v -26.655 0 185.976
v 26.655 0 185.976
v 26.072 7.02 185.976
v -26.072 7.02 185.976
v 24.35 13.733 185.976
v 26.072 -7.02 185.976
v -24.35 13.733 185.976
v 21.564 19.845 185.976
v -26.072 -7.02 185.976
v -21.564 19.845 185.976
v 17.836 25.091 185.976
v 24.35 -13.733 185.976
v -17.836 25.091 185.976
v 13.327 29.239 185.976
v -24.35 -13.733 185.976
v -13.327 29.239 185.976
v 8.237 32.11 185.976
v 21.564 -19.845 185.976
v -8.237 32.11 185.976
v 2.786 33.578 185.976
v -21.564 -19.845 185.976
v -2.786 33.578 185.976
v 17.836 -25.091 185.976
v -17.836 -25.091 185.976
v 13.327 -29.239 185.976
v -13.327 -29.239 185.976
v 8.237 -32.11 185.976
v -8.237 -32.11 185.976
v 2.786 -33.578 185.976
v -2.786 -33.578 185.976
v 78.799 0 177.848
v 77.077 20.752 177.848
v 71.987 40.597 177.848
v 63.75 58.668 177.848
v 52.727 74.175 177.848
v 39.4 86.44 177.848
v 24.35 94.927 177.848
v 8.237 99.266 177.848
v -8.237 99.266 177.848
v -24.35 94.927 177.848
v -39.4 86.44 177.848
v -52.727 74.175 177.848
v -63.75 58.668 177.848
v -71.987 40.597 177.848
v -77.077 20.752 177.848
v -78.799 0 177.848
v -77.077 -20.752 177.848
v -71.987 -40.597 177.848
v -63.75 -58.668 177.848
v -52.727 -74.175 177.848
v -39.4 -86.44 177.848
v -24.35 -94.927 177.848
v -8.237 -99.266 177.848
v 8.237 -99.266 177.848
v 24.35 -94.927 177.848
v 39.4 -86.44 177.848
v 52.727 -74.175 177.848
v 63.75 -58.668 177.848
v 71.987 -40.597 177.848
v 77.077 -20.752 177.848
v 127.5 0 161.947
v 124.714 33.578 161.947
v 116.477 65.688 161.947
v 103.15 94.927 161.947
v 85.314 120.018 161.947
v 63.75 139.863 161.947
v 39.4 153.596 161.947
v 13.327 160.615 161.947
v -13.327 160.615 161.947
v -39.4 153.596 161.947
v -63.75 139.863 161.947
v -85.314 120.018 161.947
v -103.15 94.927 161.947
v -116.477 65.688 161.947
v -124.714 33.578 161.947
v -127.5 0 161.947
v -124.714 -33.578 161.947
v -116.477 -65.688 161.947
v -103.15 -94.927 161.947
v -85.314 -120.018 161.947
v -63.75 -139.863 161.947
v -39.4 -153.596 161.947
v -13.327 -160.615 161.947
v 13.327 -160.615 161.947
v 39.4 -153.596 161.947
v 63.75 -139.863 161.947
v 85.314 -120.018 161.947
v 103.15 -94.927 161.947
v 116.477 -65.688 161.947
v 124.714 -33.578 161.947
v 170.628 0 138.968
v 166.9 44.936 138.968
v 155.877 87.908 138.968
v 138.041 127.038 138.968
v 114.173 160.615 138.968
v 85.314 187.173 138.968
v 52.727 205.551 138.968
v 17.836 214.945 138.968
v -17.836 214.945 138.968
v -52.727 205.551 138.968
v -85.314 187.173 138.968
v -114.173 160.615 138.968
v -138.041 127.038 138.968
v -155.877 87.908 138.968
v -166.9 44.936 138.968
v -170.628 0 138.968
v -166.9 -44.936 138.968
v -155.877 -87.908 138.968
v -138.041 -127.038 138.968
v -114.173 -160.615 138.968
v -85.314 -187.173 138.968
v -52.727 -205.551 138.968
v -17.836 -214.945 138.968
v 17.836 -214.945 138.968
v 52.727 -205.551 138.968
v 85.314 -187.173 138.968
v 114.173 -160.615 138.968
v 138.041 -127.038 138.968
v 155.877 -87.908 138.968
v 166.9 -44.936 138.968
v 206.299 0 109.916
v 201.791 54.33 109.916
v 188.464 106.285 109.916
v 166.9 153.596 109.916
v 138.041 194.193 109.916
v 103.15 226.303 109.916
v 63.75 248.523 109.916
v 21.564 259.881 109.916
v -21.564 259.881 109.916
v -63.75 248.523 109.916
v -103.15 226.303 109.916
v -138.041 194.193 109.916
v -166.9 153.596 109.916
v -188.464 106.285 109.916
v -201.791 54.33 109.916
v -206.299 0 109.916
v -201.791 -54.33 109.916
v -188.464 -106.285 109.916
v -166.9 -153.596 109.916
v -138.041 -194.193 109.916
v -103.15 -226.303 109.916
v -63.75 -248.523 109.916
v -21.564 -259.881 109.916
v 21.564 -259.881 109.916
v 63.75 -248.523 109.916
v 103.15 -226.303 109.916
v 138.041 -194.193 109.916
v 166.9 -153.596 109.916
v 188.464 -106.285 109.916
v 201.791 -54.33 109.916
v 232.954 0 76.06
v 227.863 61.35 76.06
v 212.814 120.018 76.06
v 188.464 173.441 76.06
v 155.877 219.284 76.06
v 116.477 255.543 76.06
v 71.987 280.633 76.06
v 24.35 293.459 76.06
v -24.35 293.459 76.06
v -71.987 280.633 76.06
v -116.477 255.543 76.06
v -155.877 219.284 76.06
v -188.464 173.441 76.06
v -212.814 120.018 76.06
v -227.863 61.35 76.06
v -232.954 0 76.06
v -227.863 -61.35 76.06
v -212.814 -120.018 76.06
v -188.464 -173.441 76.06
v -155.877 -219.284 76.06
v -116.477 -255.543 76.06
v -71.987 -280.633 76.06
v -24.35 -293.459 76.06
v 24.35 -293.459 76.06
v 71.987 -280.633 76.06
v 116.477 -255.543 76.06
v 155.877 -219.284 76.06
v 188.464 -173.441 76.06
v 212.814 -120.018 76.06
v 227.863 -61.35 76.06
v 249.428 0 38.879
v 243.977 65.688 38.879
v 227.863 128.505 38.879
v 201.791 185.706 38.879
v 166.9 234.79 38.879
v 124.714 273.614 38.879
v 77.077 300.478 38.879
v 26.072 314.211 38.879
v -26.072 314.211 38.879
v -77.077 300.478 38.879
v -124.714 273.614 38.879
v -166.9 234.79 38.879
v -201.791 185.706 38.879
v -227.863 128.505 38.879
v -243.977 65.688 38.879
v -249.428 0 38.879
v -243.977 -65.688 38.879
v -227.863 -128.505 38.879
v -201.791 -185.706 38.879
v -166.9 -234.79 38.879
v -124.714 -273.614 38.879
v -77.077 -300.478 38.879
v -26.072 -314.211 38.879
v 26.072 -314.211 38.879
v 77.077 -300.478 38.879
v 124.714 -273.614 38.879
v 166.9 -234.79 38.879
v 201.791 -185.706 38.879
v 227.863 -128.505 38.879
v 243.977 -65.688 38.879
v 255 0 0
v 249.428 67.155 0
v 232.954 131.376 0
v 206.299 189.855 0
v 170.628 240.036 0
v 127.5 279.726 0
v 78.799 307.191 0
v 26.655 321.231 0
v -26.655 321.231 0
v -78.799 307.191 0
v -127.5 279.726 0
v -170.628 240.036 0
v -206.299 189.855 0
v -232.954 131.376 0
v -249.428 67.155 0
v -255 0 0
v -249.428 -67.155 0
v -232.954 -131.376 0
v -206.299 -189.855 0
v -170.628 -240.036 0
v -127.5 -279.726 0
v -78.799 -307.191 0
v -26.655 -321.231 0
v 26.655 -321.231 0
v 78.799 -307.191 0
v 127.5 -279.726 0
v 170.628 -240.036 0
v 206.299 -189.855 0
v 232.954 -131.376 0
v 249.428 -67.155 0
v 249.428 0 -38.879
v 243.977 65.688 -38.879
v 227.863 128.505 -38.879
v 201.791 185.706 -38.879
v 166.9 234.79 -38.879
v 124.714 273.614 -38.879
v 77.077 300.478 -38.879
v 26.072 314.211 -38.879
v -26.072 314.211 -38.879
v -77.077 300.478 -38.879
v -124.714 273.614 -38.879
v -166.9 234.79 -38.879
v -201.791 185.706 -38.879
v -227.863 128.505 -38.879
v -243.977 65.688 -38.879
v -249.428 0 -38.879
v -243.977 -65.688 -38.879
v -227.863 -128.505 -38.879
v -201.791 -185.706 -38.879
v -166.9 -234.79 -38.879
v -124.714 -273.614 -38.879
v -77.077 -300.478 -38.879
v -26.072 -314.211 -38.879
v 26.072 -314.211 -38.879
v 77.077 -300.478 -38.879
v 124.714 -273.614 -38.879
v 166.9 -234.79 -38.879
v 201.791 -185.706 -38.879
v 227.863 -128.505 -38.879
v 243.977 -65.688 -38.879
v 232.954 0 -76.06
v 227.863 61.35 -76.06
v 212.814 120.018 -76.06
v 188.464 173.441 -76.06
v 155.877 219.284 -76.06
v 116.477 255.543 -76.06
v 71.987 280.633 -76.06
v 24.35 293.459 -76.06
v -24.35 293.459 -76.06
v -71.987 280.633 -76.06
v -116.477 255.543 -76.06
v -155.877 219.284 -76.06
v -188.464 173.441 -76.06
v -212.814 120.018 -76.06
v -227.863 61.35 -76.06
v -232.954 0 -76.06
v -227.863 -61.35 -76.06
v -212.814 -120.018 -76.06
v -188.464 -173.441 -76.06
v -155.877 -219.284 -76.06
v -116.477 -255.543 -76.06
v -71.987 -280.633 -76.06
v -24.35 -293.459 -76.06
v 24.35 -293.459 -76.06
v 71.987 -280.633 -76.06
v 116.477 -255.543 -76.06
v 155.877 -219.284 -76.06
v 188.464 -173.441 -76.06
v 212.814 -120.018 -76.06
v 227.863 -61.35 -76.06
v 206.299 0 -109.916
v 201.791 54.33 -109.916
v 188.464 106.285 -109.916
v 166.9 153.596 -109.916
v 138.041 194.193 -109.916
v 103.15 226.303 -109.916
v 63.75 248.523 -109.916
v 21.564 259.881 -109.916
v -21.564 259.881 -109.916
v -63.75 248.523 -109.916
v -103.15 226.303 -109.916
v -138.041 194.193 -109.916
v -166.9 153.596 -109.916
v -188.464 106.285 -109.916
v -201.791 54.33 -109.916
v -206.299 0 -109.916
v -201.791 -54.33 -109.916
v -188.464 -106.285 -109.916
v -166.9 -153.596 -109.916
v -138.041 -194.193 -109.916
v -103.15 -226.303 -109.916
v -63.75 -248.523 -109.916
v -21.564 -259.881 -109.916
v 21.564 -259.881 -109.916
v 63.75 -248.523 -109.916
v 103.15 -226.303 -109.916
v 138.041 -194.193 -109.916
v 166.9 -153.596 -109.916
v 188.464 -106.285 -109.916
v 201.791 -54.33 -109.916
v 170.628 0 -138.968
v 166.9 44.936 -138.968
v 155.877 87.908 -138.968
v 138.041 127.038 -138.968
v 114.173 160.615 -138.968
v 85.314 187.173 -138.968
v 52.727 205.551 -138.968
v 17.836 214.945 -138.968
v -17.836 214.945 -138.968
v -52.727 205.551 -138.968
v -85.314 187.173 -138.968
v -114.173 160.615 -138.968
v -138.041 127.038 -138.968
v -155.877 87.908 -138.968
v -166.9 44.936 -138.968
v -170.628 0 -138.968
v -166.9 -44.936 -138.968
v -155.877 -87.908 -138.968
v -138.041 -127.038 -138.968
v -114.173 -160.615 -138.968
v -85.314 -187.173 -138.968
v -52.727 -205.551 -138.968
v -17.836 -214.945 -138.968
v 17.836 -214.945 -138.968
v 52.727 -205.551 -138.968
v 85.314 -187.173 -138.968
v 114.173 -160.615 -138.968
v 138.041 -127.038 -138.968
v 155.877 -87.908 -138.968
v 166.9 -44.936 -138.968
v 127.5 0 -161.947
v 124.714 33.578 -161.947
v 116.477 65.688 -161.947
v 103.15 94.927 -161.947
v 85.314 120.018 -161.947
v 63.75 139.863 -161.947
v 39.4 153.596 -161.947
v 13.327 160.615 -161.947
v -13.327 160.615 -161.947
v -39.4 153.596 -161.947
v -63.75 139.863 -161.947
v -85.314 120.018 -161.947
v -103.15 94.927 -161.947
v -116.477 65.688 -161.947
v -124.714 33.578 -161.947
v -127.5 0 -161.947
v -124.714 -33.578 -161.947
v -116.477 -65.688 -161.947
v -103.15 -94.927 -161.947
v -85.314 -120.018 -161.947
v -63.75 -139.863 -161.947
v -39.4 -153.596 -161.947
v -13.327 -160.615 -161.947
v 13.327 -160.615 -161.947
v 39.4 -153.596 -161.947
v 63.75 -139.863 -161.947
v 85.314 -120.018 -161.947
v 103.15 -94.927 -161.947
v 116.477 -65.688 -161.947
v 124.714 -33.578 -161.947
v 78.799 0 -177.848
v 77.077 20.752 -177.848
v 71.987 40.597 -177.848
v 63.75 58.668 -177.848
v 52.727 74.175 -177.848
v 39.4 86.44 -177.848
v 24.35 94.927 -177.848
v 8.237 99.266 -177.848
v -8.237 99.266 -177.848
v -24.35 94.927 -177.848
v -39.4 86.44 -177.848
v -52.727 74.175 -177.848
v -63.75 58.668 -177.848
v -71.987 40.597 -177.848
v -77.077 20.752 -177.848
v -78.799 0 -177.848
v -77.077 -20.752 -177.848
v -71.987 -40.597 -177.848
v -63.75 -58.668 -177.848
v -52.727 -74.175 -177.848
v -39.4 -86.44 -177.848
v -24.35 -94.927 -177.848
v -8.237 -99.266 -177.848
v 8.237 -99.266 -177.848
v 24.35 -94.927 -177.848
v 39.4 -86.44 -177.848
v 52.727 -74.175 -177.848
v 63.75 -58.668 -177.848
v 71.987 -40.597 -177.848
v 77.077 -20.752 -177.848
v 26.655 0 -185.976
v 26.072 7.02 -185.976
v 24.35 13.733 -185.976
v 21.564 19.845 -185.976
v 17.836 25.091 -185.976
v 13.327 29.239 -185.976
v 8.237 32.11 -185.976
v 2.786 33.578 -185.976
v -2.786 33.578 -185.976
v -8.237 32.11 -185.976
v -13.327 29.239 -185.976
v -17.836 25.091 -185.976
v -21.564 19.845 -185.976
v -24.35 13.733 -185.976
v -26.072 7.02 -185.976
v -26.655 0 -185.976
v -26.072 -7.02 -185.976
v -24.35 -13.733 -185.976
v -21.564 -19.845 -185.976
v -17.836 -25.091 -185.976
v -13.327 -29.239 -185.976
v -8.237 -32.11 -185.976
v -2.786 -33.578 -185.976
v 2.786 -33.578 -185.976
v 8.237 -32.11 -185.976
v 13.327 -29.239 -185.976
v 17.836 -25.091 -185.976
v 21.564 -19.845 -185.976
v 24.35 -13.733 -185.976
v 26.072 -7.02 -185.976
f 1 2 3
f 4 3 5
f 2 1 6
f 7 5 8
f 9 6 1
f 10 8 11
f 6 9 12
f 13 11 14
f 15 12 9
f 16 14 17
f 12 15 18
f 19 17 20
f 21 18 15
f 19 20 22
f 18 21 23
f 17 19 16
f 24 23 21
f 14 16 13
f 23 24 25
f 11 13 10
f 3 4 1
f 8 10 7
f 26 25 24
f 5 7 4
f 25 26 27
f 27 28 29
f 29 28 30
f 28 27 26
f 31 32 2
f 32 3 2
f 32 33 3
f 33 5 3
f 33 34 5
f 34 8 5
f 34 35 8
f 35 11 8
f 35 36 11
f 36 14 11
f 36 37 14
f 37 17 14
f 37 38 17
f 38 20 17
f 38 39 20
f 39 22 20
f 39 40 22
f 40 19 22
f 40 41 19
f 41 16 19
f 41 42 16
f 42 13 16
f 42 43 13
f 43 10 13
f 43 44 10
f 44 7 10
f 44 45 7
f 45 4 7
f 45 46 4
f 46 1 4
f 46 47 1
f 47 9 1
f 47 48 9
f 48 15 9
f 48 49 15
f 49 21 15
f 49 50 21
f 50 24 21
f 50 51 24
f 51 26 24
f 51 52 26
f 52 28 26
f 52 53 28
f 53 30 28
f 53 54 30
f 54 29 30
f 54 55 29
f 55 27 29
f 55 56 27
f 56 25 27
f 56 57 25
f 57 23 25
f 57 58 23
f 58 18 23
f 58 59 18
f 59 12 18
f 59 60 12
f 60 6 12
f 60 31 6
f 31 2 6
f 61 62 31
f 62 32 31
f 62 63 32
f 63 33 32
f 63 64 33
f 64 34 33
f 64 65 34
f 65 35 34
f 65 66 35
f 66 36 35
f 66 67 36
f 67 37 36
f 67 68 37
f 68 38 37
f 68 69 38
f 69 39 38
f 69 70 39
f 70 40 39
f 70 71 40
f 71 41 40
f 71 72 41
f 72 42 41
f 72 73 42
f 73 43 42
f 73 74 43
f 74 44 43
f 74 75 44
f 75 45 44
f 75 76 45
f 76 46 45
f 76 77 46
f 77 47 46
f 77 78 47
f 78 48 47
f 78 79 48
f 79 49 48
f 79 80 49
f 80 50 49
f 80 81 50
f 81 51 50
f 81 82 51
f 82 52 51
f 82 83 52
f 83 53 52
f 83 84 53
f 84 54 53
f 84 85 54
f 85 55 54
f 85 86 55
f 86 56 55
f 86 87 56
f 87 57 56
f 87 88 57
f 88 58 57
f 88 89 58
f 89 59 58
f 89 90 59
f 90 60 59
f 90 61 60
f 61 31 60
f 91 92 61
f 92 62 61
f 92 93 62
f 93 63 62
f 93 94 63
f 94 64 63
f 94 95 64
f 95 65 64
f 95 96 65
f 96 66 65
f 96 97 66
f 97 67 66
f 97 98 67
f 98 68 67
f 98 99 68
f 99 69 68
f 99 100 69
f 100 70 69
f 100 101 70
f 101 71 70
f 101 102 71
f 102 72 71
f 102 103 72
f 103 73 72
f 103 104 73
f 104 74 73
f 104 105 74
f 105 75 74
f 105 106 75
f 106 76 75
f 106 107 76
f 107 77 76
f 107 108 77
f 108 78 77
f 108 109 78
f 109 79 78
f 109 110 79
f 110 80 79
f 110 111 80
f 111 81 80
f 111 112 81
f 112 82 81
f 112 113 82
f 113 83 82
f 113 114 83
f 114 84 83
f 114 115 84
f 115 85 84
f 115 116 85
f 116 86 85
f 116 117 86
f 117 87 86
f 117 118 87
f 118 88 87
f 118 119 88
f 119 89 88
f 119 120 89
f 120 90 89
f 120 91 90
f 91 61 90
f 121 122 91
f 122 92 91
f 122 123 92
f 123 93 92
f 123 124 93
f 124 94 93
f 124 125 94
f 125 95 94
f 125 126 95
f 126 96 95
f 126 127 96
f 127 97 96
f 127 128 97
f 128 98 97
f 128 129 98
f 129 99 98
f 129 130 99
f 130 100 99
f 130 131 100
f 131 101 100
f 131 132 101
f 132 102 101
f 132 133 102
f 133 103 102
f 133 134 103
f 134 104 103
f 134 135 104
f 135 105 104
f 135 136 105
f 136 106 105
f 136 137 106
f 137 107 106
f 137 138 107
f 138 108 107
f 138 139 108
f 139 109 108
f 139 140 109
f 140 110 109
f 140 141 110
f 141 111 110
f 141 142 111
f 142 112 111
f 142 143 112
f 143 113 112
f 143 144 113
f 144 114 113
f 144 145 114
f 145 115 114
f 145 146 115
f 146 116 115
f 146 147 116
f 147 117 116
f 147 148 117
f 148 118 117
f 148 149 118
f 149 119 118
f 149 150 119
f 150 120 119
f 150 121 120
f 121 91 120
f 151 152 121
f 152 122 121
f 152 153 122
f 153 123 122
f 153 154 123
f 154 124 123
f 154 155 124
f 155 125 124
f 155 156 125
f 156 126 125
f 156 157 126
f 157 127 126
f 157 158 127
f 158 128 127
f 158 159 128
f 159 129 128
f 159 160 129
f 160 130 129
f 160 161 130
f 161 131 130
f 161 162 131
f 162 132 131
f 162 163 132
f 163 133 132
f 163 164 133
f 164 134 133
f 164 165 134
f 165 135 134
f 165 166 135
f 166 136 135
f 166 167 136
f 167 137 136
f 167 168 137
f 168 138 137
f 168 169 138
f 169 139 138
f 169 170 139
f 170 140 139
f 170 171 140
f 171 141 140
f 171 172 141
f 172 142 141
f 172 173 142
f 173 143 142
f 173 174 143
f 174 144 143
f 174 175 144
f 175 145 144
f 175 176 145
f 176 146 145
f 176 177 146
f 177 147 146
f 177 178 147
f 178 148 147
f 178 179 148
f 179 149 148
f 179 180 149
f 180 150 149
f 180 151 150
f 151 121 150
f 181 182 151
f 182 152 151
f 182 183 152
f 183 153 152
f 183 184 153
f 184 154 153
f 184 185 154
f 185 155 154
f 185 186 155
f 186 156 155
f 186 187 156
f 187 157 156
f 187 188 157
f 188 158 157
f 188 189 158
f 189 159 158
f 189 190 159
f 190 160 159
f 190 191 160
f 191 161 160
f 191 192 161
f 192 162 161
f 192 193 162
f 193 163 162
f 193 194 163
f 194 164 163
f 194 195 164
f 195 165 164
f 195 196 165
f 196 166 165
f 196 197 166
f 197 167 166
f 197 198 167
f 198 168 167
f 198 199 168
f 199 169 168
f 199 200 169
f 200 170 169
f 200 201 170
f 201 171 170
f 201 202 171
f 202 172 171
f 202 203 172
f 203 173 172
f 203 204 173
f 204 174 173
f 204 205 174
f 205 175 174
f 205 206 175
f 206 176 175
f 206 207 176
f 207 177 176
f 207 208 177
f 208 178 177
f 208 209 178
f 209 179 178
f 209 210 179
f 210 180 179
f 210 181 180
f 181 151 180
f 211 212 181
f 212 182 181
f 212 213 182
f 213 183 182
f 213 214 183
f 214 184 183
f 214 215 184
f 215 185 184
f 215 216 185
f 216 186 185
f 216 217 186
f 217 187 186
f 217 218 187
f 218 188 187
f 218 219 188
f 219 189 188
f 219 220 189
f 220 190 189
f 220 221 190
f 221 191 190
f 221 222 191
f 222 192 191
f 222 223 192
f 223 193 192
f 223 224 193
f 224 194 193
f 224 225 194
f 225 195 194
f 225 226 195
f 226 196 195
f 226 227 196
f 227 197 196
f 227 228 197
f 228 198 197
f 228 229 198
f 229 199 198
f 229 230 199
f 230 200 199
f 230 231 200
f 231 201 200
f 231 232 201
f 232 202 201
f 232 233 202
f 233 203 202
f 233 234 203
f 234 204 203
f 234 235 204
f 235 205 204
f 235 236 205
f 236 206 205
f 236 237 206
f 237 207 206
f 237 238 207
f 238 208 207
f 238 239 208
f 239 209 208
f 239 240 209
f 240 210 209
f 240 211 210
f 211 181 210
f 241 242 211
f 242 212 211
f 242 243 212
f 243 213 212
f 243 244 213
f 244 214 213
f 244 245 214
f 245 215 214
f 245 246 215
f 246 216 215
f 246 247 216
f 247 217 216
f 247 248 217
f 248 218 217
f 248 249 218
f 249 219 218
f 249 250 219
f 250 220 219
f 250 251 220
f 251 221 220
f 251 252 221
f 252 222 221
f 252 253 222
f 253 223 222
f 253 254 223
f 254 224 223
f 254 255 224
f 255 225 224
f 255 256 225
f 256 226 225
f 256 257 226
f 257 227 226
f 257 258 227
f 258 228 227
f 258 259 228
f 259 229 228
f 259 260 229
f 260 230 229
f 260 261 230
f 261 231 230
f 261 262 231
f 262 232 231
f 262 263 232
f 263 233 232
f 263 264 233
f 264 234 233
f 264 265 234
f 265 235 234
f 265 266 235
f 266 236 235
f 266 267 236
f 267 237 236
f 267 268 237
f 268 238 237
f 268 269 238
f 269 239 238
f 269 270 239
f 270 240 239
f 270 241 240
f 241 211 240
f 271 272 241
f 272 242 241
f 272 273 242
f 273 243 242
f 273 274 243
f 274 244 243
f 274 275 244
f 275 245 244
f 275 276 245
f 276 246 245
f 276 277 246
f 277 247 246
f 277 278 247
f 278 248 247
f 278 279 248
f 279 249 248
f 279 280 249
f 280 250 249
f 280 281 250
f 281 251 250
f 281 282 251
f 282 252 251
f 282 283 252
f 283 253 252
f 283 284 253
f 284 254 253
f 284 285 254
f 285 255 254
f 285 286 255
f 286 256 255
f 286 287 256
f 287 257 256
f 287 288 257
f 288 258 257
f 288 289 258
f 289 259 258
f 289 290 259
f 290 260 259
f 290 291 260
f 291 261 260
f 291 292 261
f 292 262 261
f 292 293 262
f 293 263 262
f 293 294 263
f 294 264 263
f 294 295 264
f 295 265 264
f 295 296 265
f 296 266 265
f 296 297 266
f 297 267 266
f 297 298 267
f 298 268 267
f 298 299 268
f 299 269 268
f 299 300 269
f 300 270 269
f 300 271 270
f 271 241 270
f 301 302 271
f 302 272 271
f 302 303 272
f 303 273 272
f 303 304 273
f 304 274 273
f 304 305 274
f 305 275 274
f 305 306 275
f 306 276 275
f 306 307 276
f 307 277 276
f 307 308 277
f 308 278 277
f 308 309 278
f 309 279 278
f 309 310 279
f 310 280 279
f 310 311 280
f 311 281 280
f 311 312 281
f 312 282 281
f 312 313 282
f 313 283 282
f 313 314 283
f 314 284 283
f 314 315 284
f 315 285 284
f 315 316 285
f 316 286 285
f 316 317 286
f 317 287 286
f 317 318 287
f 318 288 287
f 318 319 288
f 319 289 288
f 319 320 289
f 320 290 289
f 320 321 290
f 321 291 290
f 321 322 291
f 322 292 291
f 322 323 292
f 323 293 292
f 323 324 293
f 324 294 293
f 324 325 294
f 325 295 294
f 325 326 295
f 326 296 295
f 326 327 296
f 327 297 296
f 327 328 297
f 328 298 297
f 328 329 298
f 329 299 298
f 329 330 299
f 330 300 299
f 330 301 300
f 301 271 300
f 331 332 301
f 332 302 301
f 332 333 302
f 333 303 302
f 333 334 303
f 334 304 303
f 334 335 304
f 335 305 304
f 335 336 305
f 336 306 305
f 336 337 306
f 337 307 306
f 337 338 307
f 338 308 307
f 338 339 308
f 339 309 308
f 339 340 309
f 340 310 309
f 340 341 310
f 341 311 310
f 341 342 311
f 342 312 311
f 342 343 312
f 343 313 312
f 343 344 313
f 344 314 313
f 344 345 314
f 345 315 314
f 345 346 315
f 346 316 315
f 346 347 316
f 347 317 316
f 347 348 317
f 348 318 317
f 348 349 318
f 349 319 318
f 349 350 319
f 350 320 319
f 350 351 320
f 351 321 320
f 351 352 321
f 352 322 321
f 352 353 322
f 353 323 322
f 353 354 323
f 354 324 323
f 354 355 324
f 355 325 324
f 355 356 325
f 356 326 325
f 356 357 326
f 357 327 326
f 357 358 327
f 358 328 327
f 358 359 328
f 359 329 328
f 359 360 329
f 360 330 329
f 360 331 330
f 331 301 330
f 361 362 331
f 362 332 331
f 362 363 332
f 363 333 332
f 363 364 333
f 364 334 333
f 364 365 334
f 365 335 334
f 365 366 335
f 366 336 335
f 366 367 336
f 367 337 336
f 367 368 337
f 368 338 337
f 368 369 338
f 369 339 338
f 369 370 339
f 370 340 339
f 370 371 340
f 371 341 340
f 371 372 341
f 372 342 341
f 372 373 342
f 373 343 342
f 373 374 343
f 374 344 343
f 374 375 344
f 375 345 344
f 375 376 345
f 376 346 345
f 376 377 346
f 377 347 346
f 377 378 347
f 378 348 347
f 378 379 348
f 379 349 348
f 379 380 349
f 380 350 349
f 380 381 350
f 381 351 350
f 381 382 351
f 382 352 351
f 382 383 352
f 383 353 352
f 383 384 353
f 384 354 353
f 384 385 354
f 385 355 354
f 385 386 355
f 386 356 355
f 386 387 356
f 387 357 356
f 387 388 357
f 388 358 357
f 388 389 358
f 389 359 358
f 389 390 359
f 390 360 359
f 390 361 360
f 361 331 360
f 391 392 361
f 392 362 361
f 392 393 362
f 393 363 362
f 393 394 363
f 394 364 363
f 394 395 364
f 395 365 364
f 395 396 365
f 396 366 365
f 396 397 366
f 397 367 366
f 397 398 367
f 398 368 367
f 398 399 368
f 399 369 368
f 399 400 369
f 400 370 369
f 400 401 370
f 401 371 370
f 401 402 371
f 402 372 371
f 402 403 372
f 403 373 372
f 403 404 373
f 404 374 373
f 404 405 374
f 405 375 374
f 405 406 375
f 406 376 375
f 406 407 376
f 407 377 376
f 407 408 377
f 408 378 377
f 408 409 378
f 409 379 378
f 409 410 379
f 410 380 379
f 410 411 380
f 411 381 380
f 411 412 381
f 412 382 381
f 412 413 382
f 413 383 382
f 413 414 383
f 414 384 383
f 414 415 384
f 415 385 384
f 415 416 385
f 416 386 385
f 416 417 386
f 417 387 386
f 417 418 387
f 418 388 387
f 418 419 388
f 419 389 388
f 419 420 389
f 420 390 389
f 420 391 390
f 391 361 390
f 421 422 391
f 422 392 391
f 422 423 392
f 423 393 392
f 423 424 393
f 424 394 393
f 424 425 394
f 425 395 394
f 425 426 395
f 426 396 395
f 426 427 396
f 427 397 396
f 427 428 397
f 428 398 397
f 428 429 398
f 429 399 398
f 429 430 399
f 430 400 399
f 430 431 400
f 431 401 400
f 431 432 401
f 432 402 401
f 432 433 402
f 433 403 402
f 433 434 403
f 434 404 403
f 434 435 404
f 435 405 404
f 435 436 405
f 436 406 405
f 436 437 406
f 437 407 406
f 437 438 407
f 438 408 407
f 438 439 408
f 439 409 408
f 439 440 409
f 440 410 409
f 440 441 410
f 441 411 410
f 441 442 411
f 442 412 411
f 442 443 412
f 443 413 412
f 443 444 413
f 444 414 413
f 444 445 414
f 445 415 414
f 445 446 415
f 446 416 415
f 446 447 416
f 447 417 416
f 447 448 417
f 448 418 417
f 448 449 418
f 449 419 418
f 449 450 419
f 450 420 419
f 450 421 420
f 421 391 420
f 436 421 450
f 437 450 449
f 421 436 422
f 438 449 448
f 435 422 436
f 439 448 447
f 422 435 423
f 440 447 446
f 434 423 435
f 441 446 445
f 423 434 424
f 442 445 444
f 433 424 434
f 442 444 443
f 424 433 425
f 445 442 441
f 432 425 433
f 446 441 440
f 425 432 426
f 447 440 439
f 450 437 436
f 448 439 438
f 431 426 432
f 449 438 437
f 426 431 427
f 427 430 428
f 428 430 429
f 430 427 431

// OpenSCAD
// Generated by SolidPython 1.0.1 on 2020-07-29 00:46:52


scale(v = [15, 19, 11]) {
	sphere(r = 17);
}
/***********************************************
*********      SolidPython code:      **********
************************************************
 
# import packages: SolidPython
from solid import *
from solid.utils import *
from itertools import chain, combinations, permutations


class Resize:

    def __init__(self, scad_file):
        self.scad_file = scad_file
        #self.scad_file = import_scad(scad_file)
        # cone/cylinder param:
        self.r1 = 0
        self.r2 = 0
        self.h = 0
        # rectangular prism param:
        self.w = 0
        self.l = 0
        # ellipse param:
        self.r = 0

    # import OpenScad code (file name corresponds to shape)


    # classify shape + parameters
    def assign(self, param1, param2, param3):
        if self.scad_file == 'cone.scad':
            self.r1 = param1
            self.r2 = param2
            self.h = param3
        elif self.scad_file == 'cylinder.scad':
            self.r1 = param1
            self.r2 = param2
            self.h = param3
        elif self.scad_file == 'rectangularPrism.scad':
            self.h = param1
            self.l = param2
            self.w = param3
        else:
            self.r = param1
            self.h = param2

    # resize parameters
    def iterate(self):
        x = range(3, 20, 2)
        i = 1
        if self.scad_file == 'cone.scad':
            tempList = list(permutations(x, 2))
            for temp in tempList:
                param1 = temp[0]
                param2 = temp[1]
                filepath = 'produced_scad_files/' + 'cone' + str(param1) + '_' + str(param2) + '_' + '.scad'
                scad_render_to_file(cylinder(h=param1, r1=param2, r2=0), filepath)

        elif self.scad_file == 'cylinder.scad':
            tempList = list(permutations(x, 3))
            for temp in tempList:
                param1 = temp[0]
                param2 = temp[1]
                filepath = 'produced_scad_files/' + 'cylinder' + str(param1) + '_' + str(param2) + '_' + '.scad'
                scad_render_to_file(cylinder(h=param1, r1=param2, r2=param2), filepath)

        elif self.scad_file == 'rectangularPrism.scad':
            tempList = list(permutations(x, 3))
            for temp in tempList:
                param1 = temp[0]
                param2 = temp[1]
                param3 = temp[2]
                filepath = 'produced_scad_files/' + 'rectangularPrism' + str(param1) + '_' + str(param2) + '_' + str(
                    param3) + '.scad'
                scad_render_to_file(cube(size=(param1, param2, param3)), filepath)

        elif self.scad_file == 'ellipse.scad':
            tempList = list(permutations(x, 4))
            for temp in tempList:
                param1 = temp[0]
                param2 = temp[1]
                param3 = temp[2]
                param4 = temp[3]
                filepath = 'produced_scad_files/' + 'ellipse' + str(param1) + '_' + str(param2) + '_' + str(param3) + '_' + str(param4) + '.scad'
                scad_render_to_file(scale([param1, param2, param3])(sphere(r=param4)), filepath)

    def render_to_scadfile(self):
        scad_render_to_file(scad, 'example.scad') 
 
************************************************/
